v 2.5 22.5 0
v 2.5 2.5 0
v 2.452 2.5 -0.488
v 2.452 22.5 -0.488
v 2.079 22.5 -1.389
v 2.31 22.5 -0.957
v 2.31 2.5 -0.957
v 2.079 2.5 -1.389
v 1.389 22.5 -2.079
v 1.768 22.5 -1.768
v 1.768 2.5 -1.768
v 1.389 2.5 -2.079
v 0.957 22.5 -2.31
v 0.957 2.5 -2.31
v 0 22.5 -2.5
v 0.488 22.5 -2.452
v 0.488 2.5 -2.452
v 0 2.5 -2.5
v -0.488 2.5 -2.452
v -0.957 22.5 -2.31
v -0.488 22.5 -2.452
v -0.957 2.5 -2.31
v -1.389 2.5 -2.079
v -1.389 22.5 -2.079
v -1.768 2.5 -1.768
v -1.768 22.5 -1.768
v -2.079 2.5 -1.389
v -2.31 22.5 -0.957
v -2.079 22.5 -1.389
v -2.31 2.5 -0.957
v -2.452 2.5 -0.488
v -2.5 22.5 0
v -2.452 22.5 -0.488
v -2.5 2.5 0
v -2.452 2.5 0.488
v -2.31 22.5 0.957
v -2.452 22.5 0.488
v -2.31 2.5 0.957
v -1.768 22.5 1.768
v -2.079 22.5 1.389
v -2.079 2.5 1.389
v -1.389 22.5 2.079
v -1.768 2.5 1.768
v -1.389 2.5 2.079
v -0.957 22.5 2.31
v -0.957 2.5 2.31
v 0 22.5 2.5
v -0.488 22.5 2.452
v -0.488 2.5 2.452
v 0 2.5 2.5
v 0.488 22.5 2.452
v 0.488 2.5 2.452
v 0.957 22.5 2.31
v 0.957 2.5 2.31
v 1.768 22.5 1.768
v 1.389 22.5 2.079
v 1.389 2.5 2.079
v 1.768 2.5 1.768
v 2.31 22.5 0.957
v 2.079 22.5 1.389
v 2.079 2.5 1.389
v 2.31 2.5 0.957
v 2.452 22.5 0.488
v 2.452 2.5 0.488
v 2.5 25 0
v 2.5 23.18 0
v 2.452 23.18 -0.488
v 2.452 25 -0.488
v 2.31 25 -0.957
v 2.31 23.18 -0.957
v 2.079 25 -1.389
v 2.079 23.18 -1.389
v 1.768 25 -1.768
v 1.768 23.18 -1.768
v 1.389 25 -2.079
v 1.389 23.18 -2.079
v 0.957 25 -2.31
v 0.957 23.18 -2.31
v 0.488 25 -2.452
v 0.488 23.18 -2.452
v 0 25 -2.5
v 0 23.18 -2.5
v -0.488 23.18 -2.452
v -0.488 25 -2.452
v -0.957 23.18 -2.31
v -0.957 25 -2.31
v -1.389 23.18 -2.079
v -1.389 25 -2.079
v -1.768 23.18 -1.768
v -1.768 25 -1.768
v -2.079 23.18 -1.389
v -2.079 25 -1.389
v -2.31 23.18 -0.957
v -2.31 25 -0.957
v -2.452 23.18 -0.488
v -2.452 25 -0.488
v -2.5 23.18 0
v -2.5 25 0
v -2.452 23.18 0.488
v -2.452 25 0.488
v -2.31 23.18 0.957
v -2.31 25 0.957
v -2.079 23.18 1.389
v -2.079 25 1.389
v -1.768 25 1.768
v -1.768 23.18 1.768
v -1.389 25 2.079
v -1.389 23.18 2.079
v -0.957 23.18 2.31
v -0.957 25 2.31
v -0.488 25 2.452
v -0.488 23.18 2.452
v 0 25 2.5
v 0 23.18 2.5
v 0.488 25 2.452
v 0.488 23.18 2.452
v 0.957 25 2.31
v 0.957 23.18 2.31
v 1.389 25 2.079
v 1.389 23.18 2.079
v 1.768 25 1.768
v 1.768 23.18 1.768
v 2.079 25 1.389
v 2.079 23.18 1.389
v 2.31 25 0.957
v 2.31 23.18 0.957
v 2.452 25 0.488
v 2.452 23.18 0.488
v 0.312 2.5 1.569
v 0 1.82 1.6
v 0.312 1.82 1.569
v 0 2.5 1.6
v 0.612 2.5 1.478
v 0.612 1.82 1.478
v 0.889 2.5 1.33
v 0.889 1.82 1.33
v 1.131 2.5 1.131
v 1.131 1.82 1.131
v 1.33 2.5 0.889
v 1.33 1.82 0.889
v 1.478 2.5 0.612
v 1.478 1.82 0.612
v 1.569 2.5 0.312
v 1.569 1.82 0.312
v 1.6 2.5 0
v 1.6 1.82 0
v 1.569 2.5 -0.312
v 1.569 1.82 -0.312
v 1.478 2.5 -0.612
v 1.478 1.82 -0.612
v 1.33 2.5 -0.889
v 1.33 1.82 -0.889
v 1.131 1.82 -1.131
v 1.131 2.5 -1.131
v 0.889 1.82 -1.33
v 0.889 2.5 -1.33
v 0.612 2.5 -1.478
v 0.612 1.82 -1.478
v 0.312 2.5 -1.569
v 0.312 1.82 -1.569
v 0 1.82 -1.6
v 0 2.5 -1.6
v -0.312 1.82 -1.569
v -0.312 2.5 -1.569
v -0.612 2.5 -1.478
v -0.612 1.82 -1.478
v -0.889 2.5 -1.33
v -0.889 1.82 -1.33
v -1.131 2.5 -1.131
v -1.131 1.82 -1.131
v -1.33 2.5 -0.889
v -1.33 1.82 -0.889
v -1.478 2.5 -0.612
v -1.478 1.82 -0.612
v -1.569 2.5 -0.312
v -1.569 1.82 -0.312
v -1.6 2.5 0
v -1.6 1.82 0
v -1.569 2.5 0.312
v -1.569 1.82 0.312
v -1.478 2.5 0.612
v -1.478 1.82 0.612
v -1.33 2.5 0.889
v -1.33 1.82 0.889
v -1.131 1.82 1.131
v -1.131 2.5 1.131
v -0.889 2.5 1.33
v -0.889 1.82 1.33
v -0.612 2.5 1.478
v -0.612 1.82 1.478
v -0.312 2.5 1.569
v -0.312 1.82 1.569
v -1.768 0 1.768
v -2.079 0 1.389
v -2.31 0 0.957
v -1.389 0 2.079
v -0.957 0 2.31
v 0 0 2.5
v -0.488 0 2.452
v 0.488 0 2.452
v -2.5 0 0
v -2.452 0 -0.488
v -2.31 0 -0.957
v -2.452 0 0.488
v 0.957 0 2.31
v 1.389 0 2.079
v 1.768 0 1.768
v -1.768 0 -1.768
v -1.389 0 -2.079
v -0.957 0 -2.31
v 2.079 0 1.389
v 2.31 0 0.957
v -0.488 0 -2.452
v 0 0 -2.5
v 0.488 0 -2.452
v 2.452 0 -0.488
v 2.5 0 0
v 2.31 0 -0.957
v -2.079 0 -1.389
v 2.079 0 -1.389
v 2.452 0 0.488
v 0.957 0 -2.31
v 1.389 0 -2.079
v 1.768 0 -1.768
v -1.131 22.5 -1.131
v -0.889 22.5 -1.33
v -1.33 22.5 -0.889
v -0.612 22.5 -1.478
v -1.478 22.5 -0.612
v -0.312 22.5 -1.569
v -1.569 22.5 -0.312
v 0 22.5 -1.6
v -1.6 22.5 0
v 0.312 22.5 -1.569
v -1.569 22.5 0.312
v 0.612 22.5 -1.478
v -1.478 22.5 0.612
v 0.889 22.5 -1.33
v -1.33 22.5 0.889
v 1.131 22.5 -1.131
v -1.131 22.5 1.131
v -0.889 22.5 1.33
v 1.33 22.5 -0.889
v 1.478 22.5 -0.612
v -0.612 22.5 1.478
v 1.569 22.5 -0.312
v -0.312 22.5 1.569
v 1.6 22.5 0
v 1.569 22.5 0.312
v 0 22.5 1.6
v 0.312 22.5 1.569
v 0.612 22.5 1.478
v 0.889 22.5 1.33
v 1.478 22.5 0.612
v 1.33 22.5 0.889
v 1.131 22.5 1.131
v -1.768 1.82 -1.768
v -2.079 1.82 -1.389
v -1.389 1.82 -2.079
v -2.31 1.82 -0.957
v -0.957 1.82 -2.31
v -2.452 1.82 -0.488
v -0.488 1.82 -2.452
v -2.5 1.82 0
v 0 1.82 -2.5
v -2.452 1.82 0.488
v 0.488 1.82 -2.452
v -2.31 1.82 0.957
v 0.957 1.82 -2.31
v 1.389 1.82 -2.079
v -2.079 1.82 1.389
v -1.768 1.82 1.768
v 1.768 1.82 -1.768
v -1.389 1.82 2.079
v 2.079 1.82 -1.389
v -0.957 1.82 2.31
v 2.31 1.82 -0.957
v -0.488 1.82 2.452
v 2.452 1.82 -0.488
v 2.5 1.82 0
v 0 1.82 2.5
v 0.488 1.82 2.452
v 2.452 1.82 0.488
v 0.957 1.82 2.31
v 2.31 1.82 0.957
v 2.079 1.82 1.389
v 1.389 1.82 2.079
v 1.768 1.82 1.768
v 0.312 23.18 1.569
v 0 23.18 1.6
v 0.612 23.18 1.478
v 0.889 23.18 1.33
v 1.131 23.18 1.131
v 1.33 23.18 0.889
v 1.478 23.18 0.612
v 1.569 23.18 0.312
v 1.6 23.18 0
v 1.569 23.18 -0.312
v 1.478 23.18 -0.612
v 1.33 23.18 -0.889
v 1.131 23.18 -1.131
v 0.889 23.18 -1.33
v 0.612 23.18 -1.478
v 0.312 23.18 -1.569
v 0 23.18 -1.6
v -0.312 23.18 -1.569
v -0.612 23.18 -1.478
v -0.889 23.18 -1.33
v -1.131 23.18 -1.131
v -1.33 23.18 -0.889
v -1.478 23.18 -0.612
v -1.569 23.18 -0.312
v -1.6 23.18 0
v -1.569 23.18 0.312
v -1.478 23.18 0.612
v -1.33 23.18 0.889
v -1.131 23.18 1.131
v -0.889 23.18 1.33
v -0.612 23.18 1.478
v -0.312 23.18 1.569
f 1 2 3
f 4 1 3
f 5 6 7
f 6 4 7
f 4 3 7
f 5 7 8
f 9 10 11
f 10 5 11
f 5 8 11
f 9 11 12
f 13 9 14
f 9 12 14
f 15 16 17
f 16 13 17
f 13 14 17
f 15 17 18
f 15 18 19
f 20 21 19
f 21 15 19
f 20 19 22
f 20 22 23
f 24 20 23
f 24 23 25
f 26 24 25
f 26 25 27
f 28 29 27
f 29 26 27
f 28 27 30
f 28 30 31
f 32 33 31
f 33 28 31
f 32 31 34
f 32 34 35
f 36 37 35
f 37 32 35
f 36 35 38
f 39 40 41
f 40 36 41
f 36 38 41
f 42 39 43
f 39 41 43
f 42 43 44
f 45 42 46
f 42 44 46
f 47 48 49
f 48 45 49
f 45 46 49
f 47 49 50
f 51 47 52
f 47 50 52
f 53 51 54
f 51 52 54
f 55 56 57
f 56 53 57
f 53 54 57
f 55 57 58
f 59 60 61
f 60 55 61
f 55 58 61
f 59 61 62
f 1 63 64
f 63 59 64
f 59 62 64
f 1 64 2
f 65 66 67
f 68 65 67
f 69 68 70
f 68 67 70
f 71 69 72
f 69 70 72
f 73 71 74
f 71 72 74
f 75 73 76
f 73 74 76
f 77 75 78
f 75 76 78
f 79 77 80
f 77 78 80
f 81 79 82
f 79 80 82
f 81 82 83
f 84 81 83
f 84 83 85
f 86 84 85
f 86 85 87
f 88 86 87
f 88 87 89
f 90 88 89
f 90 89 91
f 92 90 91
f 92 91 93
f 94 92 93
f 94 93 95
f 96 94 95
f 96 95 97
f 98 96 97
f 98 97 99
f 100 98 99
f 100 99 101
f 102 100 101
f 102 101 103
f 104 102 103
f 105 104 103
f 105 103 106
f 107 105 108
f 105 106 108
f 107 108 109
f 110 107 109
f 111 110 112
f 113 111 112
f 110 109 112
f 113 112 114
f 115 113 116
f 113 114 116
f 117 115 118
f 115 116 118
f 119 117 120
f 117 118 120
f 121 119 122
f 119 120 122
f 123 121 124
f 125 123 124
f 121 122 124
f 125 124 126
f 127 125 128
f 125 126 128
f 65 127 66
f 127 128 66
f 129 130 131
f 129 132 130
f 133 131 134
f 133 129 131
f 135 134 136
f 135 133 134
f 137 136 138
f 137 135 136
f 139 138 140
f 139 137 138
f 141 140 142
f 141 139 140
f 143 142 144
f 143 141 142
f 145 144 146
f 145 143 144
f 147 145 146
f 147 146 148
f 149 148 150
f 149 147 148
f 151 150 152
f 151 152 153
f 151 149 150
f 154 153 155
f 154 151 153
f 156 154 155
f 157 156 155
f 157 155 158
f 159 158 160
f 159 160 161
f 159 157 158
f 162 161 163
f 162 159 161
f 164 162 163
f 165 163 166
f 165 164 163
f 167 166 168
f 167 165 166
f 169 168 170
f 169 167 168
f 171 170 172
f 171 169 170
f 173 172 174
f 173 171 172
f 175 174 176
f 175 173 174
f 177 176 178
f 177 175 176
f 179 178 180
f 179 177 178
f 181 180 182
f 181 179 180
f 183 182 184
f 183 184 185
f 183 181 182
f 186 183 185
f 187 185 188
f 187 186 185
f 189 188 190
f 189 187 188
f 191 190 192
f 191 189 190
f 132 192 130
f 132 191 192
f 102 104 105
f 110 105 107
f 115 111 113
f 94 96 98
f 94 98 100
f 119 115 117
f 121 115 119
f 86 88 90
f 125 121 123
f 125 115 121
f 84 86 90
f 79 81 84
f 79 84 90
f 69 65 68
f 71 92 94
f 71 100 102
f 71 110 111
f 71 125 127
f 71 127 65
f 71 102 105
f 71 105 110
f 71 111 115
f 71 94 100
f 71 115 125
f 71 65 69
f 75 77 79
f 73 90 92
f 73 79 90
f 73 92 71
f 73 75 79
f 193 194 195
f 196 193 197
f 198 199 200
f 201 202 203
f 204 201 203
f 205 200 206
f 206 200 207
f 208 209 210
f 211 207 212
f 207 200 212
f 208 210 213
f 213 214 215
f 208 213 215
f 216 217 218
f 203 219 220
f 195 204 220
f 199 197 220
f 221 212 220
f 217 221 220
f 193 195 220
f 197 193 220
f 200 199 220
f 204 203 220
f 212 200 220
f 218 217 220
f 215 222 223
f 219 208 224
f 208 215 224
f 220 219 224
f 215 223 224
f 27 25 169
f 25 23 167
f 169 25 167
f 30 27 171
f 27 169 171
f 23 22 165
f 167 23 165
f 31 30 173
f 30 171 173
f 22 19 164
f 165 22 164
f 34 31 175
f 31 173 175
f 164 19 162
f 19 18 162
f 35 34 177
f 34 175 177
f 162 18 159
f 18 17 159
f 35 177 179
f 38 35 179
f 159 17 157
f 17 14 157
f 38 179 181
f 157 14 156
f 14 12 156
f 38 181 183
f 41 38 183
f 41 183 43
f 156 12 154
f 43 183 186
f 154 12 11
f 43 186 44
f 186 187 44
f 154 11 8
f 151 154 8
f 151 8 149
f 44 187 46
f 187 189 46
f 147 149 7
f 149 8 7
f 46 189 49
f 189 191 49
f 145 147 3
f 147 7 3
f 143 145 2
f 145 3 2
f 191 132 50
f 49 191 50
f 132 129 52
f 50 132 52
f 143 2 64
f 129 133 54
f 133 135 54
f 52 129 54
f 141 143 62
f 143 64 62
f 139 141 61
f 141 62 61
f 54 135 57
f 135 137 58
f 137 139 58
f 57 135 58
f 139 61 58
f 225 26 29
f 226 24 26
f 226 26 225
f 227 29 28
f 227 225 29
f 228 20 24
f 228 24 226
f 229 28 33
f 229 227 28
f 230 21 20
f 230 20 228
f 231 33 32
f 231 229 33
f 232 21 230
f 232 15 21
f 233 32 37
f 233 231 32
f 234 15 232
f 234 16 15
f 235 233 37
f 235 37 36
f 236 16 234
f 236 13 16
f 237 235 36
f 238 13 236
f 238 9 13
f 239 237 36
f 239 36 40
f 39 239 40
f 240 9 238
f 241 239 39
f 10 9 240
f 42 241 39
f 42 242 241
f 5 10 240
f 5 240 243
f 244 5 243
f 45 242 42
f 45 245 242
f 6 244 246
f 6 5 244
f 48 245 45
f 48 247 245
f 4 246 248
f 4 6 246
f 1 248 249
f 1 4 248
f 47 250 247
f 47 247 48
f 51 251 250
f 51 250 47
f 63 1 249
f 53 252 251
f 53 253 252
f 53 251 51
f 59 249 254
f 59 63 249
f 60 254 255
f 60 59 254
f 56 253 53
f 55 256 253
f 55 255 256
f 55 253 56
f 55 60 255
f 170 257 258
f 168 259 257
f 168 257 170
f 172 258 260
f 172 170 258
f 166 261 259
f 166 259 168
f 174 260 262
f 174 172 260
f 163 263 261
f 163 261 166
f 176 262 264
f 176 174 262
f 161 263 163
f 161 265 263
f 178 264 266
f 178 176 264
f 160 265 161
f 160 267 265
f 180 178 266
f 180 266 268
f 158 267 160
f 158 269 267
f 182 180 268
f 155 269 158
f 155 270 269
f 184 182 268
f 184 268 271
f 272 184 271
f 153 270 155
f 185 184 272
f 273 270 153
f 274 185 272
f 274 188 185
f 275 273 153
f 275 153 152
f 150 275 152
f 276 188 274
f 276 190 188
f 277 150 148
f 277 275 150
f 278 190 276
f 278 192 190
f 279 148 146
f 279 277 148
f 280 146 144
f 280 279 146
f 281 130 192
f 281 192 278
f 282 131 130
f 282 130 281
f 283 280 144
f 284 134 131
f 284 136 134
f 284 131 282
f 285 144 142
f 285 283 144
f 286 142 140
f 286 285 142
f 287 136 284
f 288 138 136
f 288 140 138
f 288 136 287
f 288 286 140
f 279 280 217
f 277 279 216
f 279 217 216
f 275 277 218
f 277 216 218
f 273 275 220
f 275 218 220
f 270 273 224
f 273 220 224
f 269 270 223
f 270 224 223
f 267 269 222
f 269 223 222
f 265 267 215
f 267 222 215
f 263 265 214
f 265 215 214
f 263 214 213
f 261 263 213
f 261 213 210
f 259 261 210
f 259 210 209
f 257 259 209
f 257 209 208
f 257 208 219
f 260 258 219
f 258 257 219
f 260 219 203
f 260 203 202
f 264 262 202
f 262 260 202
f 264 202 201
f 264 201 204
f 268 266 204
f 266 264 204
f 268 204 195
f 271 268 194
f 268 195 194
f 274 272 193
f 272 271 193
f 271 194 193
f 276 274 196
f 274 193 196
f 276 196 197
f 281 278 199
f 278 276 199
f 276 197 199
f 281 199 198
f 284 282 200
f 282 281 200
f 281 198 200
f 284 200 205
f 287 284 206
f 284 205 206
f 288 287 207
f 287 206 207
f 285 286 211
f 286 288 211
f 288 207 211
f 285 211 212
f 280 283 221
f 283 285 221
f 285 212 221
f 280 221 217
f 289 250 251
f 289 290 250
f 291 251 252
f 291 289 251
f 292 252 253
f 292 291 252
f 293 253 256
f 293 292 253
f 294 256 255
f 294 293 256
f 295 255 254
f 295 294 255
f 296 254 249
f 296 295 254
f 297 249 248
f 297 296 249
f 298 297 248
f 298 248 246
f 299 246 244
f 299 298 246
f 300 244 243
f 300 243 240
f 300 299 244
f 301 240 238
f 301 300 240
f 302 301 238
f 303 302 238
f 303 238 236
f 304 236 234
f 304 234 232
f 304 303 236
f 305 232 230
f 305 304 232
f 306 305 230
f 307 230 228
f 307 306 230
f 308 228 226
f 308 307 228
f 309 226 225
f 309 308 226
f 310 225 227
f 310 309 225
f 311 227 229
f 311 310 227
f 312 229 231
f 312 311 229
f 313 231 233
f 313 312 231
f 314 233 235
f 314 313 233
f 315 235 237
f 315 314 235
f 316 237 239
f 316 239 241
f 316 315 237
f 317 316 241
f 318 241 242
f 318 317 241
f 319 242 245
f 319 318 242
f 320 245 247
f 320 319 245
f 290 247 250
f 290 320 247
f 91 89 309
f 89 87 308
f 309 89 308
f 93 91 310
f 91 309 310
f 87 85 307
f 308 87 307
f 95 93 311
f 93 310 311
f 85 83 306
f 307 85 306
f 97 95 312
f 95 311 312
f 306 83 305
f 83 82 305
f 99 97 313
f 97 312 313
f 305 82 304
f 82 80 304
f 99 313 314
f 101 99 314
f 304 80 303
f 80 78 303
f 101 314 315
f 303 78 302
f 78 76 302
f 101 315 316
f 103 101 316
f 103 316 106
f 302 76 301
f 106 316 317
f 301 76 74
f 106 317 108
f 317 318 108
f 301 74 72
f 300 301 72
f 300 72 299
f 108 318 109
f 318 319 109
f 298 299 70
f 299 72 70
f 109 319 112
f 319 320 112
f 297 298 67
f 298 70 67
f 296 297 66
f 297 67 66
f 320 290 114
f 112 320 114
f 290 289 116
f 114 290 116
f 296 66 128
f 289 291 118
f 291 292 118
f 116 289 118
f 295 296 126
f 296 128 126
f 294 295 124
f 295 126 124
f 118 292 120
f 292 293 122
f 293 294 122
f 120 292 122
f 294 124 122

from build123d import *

# Parameters (mm, degrees)
SKETCH2_R           = 2.5
BOSS_EXTRUDE1_DEPTH = 25
SKETCH3_W           = 0.9
SKETCH3_H           = 0.68


with BuildPart() as part:
    # Sketch2 → Boss-Extrude1 (new body)
    with BuildSketch(Plane(origin=(0, 0, 0), x_dir=(1, 0, 0), z_dir=(0, 1, 0))):
        Circle(SKETCH2_R)
    extrude(amount=BOSS_EXTRUDE1_DEPTH)

    # Sketch3 → Cut-Revolve1 (revolve, cut)
    with BuildSketch(Plane(origin=(0, 0, 0), x_dir=(0, 0, -1), z_dir=(1, 0, 0))):
        with Locations((-2.05, 2.16)):
            Rectangle(SKETCH3_W, SKETCH3_H)
        with Locations((-2.05, 22.84)):
            Rectangle(SKETCH3_W, SKETCH3_H)
    revolve(axis=Axis((0, 0, 0), (0, 1, 0)), mode=Mode.SUBTRACT)


solid = part.part
